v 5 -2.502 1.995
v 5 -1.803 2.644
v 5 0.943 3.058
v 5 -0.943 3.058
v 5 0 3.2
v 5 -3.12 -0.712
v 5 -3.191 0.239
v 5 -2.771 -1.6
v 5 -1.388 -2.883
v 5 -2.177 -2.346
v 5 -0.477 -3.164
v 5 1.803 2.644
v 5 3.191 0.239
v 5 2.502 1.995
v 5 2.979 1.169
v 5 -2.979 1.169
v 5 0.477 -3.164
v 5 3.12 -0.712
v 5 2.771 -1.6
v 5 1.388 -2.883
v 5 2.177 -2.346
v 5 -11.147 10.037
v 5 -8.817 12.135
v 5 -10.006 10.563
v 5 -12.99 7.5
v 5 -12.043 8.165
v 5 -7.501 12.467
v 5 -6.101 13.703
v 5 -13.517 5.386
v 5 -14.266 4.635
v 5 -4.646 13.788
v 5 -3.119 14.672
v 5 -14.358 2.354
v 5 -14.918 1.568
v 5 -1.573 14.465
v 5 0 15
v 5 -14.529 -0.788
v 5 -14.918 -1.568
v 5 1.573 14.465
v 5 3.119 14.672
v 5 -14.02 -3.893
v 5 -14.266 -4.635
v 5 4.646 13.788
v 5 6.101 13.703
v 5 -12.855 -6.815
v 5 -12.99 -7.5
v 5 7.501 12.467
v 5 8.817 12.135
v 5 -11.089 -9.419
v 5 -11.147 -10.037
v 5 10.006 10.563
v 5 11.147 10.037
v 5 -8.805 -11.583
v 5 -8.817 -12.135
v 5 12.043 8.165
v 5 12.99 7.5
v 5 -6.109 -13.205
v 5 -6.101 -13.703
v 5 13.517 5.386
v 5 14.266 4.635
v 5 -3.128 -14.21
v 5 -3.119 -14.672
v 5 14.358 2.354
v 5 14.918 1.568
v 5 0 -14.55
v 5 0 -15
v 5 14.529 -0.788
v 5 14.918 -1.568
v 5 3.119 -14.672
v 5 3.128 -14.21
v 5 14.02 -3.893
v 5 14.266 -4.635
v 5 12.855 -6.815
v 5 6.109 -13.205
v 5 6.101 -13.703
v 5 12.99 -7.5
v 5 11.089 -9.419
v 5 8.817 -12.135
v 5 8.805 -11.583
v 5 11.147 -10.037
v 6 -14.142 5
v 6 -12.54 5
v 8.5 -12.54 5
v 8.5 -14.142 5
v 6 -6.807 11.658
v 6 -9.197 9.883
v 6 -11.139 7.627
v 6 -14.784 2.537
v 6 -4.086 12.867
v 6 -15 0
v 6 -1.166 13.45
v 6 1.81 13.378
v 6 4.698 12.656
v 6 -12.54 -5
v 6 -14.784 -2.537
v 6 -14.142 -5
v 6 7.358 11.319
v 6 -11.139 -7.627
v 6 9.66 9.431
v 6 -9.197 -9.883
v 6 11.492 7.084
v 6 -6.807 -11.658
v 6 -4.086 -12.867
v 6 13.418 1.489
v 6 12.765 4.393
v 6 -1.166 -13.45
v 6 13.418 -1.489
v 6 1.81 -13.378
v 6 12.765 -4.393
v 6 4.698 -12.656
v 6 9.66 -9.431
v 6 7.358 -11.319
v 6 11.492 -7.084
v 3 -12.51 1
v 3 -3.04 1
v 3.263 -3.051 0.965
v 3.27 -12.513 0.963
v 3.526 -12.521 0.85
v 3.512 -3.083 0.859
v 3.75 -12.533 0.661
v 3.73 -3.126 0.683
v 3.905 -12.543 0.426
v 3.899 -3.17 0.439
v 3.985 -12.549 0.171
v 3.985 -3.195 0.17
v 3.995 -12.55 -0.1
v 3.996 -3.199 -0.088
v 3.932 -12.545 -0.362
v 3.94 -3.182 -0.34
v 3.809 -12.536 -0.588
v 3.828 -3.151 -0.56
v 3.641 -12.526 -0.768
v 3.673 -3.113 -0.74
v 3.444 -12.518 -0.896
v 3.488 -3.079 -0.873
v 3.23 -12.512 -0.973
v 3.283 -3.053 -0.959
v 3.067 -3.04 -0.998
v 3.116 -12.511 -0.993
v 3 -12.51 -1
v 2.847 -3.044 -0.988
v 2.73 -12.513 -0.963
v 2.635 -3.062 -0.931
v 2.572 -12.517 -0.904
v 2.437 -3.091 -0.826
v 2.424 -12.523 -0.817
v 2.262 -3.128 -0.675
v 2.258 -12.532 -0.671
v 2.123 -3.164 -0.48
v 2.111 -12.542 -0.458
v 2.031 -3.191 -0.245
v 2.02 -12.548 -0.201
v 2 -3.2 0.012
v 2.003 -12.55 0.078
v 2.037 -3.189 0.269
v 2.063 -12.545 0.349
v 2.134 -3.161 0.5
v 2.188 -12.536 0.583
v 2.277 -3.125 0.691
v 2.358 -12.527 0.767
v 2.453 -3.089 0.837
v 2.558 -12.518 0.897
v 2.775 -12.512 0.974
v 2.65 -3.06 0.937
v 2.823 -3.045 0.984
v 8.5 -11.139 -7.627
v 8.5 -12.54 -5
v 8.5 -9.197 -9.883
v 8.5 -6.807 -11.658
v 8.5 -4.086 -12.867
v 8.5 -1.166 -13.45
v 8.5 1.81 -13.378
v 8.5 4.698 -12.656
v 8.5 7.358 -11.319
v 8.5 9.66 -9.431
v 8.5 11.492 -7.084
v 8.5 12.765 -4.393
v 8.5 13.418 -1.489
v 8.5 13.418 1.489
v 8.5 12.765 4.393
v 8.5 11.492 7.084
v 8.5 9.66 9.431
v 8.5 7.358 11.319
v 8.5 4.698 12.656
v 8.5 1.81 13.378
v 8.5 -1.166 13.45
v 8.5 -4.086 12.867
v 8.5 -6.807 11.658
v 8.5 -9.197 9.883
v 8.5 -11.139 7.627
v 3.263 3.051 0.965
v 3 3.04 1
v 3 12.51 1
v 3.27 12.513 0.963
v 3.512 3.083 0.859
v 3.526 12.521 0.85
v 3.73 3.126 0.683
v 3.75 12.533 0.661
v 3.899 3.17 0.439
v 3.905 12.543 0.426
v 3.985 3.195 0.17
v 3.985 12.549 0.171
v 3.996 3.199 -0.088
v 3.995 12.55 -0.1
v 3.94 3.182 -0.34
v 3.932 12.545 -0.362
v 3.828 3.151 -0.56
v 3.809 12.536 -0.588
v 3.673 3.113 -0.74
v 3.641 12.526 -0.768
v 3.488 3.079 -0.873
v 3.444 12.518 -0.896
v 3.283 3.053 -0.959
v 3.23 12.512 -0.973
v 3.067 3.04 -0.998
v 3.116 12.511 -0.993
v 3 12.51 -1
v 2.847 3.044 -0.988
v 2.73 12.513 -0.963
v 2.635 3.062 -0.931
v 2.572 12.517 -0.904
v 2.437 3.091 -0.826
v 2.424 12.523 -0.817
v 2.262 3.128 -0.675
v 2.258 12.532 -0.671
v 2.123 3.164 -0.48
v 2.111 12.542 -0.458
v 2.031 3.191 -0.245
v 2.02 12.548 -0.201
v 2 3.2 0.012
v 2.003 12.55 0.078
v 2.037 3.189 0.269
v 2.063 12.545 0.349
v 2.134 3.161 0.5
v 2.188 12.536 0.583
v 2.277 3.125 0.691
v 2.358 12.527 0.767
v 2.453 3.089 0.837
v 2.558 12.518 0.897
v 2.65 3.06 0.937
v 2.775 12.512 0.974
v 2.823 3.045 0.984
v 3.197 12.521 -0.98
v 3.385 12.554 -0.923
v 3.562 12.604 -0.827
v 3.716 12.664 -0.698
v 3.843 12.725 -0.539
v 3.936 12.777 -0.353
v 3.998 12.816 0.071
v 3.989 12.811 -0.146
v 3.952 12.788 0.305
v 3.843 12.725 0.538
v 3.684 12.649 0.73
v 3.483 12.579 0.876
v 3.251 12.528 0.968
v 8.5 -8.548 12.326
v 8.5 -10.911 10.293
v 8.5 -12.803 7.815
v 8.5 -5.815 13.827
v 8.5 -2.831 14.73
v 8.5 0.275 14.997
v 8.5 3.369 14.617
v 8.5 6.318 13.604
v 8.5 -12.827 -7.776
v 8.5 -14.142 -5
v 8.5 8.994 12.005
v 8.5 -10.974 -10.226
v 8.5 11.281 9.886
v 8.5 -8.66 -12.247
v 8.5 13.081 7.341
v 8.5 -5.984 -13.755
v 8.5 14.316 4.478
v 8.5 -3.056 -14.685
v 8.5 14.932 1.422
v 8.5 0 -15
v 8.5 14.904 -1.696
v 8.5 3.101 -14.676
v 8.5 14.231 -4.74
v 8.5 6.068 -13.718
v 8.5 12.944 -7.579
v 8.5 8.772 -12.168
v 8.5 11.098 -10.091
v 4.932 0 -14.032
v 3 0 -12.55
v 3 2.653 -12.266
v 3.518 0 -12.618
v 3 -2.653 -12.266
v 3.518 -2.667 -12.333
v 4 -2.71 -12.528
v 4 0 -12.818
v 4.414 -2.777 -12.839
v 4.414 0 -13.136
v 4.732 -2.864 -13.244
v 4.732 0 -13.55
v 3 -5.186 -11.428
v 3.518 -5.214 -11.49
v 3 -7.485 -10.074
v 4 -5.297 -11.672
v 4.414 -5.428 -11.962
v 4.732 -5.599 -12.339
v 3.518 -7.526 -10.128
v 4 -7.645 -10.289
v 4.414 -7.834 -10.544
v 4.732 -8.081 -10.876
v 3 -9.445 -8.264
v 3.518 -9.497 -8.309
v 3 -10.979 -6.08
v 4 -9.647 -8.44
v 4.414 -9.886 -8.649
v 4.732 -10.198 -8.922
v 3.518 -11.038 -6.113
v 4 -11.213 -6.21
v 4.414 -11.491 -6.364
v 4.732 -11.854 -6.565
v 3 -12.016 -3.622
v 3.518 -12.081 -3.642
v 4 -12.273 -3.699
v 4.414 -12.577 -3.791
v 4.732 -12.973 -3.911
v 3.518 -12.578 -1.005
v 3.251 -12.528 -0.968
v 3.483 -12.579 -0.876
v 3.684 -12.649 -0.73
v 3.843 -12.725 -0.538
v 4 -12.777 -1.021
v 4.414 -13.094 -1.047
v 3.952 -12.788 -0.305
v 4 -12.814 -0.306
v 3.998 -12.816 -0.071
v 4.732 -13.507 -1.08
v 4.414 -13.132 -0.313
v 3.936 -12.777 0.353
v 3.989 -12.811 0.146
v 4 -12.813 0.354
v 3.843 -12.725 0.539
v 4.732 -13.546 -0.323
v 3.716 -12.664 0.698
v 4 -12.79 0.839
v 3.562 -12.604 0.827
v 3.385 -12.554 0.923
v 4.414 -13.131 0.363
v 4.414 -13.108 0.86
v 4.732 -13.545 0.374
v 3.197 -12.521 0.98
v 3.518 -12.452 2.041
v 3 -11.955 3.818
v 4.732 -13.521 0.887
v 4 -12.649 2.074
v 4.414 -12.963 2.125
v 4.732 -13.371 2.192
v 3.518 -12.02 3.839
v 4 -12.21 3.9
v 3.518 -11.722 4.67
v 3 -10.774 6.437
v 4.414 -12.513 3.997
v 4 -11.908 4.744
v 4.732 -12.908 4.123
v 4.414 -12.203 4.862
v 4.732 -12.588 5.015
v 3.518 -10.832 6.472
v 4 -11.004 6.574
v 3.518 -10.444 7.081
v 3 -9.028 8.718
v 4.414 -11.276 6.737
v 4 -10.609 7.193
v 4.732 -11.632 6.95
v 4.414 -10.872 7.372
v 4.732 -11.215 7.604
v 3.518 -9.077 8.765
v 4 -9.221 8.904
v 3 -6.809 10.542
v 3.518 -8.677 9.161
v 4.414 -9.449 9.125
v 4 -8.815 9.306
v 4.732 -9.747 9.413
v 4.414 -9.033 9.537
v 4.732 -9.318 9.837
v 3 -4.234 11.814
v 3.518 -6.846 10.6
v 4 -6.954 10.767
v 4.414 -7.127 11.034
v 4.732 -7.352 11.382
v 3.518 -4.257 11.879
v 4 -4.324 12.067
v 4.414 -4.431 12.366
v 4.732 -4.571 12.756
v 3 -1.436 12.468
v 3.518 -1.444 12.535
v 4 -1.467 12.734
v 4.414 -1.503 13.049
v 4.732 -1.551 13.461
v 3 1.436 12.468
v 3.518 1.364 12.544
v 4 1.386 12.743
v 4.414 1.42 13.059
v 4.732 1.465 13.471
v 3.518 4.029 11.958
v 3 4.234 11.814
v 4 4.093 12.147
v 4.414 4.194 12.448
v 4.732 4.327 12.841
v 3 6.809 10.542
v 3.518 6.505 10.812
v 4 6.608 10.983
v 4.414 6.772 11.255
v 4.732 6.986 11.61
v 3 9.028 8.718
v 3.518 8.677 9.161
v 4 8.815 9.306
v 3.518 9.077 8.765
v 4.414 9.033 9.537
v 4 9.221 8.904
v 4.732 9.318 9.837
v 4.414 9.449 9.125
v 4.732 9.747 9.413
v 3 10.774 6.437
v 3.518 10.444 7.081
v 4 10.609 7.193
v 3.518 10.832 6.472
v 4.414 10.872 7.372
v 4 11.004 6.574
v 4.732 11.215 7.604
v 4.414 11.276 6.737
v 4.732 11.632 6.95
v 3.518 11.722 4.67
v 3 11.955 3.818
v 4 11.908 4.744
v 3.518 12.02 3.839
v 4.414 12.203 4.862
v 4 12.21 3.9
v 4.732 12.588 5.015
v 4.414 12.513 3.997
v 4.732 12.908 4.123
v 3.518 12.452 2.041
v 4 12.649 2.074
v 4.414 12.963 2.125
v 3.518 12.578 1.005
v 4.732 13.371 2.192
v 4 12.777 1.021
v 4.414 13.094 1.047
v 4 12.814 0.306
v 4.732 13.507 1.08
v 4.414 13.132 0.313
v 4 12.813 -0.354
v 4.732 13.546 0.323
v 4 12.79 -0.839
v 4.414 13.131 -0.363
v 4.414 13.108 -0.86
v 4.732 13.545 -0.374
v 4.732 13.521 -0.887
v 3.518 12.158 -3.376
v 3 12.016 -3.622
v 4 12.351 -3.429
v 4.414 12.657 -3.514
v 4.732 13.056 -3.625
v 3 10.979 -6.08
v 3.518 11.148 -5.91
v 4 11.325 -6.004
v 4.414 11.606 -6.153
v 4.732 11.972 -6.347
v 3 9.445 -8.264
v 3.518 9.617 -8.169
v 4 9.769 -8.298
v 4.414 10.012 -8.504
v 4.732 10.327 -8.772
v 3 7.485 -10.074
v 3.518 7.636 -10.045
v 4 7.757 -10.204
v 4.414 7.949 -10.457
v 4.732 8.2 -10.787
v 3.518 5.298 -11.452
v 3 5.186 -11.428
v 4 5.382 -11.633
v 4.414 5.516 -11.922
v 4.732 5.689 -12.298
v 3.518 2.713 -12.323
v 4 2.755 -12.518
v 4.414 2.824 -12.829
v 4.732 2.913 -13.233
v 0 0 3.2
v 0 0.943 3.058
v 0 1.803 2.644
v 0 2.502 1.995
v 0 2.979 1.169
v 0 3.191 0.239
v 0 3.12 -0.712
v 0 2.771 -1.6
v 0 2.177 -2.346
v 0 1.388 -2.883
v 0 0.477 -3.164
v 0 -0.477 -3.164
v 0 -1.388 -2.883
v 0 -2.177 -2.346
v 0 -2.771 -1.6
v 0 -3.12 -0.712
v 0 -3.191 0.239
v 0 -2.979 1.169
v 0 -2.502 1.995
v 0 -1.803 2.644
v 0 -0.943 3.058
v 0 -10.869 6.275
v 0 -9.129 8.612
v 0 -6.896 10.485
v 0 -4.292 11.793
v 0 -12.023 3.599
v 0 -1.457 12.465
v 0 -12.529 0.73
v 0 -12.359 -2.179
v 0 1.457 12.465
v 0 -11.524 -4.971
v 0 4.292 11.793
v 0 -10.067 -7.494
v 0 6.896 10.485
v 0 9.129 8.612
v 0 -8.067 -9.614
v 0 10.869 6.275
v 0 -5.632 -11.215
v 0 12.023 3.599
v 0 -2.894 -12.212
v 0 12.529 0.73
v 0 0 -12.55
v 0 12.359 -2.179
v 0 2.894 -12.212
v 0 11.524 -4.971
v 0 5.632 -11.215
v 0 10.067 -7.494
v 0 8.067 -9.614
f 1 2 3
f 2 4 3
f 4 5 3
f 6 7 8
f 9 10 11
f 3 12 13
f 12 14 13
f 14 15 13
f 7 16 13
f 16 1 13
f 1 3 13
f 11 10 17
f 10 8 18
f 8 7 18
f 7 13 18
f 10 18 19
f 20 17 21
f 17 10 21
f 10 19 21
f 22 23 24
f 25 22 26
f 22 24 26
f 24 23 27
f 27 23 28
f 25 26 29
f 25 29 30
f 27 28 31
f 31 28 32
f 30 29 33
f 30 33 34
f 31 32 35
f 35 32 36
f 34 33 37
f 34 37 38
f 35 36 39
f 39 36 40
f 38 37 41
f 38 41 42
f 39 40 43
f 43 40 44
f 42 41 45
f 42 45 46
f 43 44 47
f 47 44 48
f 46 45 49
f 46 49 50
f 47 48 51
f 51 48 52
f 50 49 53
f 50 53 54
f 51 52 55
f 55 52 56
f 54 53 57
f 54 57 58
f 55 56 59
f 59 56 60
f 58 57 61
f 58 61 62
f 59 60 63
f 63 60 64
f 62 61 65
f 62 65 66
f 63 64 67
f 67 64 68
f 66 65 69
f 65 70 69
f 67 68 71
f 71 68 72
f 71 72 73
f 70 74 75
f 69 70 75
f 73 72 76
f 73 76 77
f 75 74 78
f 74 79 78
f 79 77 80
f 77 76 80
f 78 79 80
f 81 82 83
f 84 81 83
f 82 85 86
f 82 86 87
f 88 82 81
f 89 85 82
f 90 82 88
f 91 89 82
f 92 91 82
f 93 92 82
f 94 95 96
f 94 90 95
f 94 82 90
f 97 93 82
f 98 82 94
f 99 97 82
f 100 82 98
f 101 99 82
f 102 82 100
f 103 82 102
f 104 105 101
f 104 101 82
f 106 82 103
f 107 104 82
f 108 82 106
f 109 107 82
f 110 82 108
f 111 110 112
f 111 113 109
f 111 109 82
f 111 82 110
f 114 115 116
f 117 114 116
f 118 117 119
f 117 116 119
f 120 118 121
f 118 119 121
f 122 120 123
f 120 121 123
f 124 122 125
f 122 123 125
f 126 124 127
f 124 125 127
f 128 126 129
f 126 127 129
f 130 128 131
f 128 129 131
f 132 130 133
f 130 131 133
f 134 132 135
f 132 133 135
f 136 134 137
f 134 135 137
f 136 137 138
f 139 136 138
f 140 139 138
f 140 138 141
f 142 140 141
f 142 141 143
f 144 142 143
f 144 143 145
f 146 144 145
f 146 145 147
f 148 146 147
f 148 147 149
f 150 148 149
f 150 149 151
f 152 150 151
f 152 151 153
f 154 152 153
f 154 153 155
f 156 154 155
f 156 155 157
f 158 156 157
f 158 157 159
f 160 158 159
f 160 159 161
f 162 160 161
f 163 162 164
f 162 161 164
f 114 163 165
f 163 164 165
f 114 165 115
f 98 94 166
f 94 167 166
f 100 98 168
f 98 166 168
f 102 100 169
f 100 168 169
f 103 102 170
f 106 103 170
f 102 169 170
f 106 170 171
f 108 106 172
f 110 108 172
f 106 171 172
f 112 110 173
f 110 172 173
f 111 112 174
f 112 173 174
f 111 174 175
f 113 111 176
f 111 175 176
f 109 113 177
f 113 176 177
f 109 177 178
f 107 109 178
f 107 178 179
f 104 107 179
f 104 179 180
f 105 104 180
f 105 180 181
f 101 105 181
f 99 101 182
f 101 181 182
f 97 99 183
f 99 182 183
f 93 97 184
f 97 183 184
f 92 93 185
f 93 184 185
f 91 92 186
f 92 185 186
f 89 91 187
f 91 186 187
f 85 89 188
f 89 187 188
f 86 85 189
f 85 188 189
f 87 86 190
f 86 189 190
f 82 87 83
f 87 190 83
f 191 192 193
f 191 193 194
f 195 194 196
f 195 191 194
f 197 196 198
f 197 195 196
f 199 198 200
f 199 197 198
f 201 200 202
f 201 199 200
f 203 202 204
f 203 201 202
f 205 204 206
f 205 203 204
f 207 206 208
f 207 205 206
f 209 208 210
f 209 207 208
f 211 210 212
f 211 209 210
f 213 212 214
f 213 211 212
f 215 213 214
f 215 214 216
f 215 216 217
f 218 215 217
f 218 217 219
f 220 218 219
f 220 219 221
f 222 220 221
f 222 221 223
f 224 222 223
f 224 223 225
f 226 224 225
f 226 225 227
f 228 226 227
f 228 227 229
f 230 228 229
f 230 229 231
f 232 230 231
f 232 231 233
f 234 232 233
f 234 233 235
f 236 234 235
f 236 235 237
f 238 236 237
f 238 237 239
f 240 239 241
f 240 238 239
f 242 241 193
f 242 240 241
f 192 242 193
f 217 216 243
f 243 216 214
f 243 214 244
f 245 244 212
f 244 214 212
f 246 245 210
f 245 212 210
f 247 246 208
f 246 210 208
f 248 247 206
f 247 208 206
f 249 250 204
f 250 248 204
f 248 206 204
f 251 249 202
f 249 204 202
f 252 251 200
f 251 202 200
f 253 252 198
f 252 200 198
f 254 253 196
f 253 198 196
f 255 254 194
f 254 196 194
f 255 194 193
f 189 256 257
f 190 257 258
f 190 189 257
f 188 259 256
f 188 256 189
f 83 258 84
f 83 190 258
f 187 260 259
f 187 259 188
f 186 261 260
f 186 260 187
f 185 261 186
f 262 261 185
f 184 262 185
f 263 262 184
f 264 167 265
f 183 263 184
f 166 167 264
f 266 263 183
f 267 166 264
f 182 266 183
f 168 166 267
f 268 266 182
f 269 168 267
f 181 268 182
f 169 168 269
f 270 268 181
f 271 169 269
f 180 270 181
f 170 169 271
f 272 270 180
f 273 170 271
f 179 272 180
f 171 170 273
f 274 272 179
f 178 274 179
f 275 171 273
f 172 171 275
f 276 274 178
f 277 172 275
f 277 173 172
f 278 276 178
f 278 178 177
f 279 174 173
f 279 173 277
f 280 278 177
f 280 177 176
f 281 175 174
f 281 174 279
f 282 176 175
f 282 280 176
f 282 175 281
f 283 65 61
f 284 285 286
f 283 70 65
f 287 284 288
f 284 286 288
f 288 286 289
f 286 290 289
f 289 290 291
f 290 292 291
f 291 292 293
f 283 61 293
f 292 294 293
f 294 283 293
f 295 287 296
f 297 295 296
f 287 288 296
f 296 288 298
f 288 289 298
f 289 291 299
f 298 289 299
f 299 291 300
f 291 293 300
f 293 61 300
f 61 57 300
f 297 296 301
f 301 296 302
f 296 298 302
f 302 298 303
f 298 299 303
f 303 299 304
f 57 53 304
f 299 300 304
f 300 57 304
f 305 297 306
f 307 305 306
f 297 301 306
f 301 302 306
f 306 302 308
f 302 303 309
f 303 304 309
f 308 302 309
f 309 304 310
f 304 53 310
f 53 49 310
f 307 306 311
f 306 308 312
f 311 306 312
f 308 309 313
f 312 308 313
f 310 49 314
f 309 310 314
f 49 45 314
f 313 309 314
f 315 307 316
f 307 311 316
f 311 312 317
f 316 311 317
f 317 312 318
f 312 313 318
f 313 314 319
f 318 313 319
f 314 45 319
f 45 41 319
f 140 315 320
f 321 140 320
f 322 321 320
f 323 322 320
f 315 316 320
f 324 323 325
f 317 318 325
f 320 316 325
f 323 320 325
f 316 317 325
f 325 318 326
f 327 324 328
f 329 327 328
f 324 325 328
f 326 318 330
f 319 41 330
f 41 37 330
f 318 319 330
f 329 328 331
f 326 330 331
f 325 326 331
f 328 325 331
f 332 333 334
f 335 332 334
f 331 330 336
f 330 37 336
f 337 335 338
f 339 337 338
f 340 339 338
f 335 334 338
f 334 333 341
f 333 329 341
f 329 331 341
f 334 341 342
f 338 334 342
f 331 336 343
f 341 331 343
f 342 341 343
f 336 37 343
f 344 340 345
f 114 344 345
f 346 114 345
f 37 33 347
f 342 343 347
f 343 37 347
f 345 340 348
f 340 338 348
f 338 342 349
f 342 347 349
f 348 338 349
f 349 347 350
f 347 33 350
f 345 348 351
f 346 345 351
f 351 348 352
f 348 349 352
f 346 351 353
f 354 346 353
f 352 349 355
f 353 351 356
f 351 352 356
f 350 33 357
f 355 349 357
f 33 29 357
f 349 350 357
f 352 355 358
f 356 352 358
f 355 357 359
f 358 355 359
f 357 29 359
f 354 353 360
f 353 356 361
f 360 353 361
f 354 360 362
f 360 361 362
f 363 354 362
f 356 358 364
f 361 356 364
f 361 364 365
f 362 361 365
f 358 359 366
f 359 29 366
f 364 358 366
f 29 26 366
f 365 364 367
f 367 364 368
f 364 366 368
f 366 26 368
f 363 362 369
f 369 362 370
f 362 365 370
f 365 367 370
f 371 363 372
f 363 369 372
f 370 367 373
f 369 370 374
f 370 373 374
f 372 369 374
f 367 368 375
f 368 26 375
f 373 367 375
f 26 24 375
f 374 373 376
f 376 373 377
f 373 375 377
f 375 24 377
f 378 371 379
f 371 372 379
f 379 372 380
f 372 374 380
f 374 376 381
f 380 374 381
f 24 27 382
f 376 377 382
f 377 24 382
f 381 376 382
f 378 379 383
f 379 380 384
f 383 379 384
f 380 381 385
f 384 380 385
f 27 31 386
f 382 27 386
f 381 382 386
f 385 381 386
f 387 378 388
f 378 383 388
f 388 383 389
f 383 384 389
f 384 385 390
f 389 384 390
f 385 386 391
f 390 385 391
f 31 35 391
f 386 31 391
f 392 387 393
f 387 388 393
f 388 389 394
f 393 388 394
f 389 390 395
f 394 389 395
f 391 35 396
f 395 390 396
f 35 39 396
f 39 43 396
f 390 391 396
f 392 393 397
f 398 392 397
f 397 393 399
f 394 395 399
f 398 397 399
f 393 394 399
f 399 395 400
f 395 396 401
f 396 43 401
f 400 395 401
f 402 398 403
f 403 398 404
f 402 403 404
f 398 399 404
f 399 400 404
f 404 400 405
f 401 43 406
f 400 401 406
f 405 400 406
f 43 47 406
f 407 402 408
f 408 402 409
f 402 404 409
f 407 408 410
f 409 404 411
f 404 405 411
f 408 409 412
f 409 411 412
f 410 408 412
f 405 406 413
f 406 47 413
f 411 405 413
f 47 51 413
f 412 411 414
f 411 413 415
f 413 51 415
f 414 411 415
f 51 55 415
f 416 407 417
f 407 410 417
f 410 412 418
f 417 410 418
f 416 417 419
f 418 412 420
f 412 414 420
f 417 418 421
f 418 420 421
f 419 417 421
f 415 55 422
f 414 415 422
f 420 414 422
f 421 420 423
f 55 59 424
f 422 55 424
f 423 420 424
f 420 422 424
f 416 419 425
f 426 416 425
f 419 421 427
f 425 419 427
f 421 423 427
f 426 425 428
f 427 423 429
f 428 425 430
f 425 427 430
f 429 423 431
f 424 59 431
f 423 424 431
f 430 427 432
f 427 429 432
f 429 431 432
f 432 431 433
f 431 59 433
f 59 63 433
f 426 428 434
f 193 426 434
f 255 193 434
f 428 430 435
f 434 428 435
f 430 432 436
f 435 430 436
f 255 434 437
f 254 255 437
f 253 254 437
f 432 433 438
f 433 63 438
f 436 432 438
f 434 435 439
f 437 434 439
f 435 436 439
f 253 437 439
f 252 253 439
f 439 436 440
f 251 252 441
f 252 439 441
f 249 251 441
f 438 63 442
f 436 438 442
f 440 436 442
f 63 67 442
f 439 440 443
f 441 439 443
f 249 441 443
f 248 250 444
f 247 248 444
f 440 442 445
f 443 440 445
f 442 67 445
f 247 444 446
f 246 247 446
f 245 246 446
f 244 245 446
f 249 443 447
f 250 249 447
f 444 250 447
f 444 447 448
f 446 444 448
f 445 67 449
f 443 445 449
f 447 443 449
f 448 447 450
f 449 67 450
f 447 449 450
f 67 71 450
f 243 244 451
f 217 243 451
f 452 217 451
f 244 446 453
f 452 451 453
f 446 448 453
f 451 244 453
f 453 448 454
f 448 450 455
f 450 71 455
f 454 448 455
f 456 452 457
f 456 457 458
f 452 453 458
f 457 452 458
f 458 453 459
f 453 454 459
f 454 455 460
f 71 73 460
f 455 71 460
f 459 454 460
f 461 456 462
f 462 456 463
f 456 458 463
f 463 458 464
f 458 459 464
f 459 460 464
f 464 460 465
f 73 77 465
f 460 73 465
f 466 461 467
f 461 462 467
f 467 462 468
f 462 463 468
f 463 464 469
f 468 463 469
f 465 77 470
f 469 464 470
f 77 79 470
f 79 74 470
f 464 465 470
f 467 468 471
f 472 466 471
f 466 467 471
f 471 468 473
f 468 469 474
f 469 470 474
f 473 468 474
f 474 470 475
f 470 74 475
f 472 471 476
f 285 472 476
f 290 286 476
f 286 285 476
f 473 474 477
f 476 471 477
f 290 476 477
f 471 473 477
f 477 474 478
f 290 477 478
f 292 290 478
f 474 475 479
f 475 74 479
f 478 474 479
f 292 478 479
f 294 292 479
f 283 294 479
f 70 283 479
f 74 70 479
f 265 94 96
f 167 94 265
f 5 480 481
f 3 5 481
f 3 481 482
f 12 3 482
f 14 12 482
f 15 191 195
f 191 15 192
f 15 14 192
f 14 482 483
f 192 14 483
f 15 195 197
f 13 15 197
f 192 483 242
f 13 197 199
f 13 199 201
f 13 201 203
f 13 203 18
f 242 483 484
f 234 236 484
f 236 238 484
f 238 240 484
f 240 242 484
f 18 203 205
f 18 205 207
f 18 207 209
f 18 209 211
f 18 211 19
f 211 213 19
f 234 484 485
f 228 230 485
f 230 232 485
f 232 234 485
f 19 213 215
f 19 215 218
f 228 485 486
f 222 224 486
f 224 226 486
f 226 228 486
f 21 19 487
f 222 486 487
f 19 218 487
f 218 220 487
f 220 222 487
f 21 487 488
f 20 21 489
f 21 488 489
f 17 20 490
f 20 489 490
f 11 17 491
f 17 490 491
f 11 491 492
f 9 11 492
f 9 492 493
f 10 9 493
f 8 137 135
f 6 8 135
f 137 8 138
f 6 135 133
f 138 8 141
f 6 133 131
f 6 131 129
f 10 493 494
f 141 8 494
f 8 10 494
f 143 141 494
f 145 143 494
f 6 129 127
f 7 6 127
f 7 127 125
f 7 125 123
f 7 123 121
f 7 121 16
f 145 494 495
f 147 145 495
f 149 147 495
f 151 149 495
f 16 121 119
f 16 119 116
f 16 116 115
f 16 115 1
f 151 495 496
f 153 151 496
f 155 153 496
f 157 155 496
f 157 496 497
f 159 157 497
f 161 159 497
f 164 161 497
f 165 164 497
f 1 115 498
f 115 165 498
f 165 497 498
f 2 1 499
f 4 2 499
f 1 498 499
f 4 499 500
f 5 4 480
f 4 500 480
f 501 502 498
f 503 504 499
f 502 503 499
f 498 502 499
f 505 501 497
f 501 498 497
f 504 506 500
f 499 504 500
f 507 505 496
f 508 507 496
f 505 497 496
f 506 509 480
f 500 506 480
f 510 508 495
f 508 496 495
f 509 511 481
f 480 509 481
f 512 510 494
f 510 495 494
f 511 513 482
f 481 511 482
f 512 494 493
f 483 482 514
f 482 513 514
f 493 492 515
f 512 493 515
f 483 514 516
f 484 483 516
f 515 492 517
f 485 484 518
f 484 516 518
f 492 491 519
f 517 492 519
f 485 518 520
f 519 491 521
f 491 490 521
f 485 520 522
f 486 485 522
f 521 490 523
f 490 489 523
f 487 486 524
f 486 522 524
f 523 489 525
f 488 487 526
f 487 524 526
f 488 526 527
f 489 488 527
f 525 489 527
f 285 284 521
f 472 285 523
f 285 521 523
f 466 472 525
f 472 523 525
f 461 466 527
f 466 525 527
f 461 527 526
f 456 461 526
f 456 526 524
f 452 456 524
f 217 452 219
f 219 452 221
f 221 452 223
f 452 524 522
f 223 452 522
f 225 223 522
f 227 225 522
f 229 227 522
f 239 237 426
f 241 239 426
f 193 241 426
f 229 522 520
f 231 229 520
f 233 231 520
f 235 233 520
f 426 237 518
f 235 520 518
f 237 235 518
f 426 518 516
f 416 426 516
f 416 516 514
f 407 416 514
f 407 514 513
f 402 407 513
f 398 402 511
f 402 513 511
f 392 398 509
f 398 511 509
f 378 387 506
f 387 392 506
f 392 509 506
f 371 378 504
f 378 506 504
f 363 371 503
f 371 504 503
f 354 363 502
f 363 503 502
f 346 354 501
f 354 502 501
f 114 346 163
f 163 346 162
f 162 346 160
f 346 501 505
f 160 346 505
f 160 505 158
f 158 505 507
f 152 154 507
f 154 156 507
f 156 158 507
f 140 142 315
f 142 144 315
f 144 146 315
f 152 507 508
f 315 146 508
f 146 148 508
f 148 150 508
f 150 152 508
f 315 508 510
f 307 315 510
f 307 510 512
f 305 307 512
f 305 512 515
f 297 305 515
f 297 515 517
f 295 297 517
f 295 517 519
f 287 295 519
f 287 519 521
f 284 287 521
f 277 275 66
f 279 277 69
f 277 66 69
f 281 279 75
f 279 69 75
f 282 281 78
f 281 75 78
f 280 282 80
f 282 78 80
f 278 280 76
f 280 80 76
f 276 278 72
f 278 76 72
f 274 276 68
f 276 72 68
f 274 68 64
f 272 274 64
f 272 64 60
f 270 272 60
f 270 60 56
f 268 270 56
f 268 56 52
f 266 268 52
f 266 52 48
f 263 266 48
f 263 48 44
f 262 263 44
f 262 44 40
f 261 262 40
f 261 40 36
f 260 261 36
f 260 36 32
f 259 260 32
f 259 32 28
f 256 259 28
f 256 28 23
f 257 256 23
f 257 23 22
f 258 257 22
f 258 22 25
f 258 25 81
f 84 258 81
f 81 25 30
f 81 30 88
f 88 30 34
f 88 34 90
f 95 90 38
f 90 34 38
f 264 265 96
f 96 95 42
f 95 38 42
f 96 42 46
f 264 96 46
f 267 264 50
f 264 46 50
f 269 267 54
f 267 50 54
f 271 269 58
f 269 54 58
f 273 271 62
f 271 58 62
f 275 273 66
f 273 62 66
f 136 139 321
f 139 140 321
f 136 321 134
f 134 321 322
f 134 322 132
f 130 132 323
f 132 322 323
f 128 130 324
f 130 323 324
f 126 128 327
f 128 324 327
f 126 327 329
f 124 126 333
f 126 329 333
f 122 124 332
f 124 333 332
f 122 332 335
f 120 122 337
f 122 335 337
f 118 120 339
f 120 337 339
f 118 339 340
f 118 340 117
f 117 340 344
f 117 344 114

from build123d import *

# Parameters (mm, degrees)
SKETCH_1_R                      = 12.55
EXTRUDE_1_DEPTH                 = 6
SKETCH_2_R                      = 3.2
CUT_EXTRUDE_1_DEPTH             = 6
CUT_EXTRUDE_2_REACH             = 20.735
SKETCH_3_R                      = 1
CUT_EXTRUDE_2_DIRECTION_2_REACH = 20.735
EXTRUDE_2_DEPTH                 = 2.5
EXTRUDE_2_DEPTH_BACK            = 1
SKETCH_4_R                      = 15
SKETCH_5_R                      = 13.5
CUT_EXTRUDE_3_DEPTH             = 2.5
FILLET_2_R                      = 2
SKETCH_7_W                      = 2.5
SKETCH_7_H                      = 10
CUT_EXTRUDE_4_DEPTH             = 21


with BuildPart() as part:
    # 草图1 → 凸台-拉伸1 (new body)
    with BuildSketch(Plane(origin=(0, 0, 0), x_dir=(0, 0, -1), z_dir=(1, 0, 0))):
        Circle(SKETCH_1_R)
    extrude(amount=EXTRUDE_1_DEPTH)

    # 草图2 → 切除-拉伸1 (cut)
    with BuildSketch(Plane.ZY):
        Circle(SKETCH_2_R)
    extrude(amount=-CUT_EXTRUDE_1_DEPTH, mode=Mode.SUBTRACT)

    # 草图3 → 切除-拉伸2 (cut, up to next)
    with BuildSketch(Plane(origin=(0, 0, 0), x_dir=(1, 0, 0), z_dir=(0, 1, 0)), mode=Mode.PRIVATE) as cut_extrude_2_sk1:
        with Locations(Location((3, 0, 0), (0, 0, 270))):
            Circle(SKETCH_3_R)
    cut_extrude_2_tool1 = extrude(cut_extrude_2_sk1.sketch, amount=-CUT_EXTRUDE_2_REACH, mode=Mode.PRIVATE) & part.part
    add(cut_extrude_2_tool1.solids().sort_by_distance((3, 0, 0))[0], mode=Mode.SUBTRACT)

    # 草图3 → 切除-拉伸2 direction 2 (cut, up to next)
    with BuildSketch(Plane(origin=(0, 0, 0), x_dir=(1, 0, 0), z_dir=(0, 1, 0)), mode=Mode.PRIVATE) as cut_extrude_2_direction_2_sk1:
        with Locations(Location((3, 0, 0), (0, 0, 270))):
            Circle(SKETCH_3_R)
    cut_extrude_2_direction_2_tool1 = extrude(cut_extrude_2_direction_2_sk1.sketch, amount=CUT_EXTRUDE_2_DIRECTION_2_REACH, mode=Mode.PRIVATE) & part.part
    add(cut_extrude_2_direction_2_tool1.solids().sort_by_distance((3, 0, 0))[0], mode=Mode.SUBTRACT)

    # 草图4 → 凸台-拉伸2 (add, two sides: drawn at the far end of the back side and taken through both)
    with BuildSketch(Plane(origin=(6, 0, 0), x_dir=(0, 0, -1), z_dir=(1, 0, 0)).offset(-EXTRUDE_2_DEPTH_BACK)):
        Circle(SKETCH_4_R)
    extrude(amount=EXTRUDE_2_DEPTH + EXTRUDE_2_DEPTH_BACK)

    # 草图5 → 切除-拉伸3 (cut)
    with BuildSketch(Plane(origin=(8.5, 0, 0), x_dir=(0, 0, -1), z_dir=(1, 0, 0))):
        Circle(SKETCH_5_R)
    extrude(amount=-CUT_EXTRUDE_3_DEPTH, mode=Mode.SUBTRACT)

    # 圆角2
    # the kernel refuses this fillet: 2 mm, written as the material it adds along each edge
    with BuildSketch(Plane(origin=(5, 0, 0), x_dir=(0, 0, -1), z_dir=(0, 1, 0))) as fillet_2_piece_1_section:
        with BuildLine():
            CenterArc((12.55 + FILLET_2_R, FILLET_2_R), FILLET_2_R, 180, 90)
            Line((12.55 + FILLET_2_R, 0), (12.55, 0))
            Line((12.55, 0), (12.55, FILLET_2_R))
        make_face()
    fillet_2_piece_1 = revolve(axis=Axis((5, 0, 0), (-1, 0, 0)), mode=Mode.PRIVATE)
    fillet_2_piece_1 = fillet_2_piece_1 - Plane(origin=(3, 0, 0), x_dir=(0, 0, 1), z_dir=(0, -1, 0)) * Cylinder(1, 59, mode=Mode.PRIVATE)
    add(fillet_2_piece_1)

    # 草图7 → 切除-拉伸4 (cut)
    with BuildSketch(Plane(origin=(0, 0, 0), x_dir=(1, 0, 0), z_dir=(0, 1, 0))):
        with Locations((7.25, 0)):
            Rectangle(SKETCH_7_W, SKETCH_7_H)
    extrude(amount=-CUT_EXTRUDE_4_DEPTH, mode=Mode.SUBTRACT)


solid = part.part
